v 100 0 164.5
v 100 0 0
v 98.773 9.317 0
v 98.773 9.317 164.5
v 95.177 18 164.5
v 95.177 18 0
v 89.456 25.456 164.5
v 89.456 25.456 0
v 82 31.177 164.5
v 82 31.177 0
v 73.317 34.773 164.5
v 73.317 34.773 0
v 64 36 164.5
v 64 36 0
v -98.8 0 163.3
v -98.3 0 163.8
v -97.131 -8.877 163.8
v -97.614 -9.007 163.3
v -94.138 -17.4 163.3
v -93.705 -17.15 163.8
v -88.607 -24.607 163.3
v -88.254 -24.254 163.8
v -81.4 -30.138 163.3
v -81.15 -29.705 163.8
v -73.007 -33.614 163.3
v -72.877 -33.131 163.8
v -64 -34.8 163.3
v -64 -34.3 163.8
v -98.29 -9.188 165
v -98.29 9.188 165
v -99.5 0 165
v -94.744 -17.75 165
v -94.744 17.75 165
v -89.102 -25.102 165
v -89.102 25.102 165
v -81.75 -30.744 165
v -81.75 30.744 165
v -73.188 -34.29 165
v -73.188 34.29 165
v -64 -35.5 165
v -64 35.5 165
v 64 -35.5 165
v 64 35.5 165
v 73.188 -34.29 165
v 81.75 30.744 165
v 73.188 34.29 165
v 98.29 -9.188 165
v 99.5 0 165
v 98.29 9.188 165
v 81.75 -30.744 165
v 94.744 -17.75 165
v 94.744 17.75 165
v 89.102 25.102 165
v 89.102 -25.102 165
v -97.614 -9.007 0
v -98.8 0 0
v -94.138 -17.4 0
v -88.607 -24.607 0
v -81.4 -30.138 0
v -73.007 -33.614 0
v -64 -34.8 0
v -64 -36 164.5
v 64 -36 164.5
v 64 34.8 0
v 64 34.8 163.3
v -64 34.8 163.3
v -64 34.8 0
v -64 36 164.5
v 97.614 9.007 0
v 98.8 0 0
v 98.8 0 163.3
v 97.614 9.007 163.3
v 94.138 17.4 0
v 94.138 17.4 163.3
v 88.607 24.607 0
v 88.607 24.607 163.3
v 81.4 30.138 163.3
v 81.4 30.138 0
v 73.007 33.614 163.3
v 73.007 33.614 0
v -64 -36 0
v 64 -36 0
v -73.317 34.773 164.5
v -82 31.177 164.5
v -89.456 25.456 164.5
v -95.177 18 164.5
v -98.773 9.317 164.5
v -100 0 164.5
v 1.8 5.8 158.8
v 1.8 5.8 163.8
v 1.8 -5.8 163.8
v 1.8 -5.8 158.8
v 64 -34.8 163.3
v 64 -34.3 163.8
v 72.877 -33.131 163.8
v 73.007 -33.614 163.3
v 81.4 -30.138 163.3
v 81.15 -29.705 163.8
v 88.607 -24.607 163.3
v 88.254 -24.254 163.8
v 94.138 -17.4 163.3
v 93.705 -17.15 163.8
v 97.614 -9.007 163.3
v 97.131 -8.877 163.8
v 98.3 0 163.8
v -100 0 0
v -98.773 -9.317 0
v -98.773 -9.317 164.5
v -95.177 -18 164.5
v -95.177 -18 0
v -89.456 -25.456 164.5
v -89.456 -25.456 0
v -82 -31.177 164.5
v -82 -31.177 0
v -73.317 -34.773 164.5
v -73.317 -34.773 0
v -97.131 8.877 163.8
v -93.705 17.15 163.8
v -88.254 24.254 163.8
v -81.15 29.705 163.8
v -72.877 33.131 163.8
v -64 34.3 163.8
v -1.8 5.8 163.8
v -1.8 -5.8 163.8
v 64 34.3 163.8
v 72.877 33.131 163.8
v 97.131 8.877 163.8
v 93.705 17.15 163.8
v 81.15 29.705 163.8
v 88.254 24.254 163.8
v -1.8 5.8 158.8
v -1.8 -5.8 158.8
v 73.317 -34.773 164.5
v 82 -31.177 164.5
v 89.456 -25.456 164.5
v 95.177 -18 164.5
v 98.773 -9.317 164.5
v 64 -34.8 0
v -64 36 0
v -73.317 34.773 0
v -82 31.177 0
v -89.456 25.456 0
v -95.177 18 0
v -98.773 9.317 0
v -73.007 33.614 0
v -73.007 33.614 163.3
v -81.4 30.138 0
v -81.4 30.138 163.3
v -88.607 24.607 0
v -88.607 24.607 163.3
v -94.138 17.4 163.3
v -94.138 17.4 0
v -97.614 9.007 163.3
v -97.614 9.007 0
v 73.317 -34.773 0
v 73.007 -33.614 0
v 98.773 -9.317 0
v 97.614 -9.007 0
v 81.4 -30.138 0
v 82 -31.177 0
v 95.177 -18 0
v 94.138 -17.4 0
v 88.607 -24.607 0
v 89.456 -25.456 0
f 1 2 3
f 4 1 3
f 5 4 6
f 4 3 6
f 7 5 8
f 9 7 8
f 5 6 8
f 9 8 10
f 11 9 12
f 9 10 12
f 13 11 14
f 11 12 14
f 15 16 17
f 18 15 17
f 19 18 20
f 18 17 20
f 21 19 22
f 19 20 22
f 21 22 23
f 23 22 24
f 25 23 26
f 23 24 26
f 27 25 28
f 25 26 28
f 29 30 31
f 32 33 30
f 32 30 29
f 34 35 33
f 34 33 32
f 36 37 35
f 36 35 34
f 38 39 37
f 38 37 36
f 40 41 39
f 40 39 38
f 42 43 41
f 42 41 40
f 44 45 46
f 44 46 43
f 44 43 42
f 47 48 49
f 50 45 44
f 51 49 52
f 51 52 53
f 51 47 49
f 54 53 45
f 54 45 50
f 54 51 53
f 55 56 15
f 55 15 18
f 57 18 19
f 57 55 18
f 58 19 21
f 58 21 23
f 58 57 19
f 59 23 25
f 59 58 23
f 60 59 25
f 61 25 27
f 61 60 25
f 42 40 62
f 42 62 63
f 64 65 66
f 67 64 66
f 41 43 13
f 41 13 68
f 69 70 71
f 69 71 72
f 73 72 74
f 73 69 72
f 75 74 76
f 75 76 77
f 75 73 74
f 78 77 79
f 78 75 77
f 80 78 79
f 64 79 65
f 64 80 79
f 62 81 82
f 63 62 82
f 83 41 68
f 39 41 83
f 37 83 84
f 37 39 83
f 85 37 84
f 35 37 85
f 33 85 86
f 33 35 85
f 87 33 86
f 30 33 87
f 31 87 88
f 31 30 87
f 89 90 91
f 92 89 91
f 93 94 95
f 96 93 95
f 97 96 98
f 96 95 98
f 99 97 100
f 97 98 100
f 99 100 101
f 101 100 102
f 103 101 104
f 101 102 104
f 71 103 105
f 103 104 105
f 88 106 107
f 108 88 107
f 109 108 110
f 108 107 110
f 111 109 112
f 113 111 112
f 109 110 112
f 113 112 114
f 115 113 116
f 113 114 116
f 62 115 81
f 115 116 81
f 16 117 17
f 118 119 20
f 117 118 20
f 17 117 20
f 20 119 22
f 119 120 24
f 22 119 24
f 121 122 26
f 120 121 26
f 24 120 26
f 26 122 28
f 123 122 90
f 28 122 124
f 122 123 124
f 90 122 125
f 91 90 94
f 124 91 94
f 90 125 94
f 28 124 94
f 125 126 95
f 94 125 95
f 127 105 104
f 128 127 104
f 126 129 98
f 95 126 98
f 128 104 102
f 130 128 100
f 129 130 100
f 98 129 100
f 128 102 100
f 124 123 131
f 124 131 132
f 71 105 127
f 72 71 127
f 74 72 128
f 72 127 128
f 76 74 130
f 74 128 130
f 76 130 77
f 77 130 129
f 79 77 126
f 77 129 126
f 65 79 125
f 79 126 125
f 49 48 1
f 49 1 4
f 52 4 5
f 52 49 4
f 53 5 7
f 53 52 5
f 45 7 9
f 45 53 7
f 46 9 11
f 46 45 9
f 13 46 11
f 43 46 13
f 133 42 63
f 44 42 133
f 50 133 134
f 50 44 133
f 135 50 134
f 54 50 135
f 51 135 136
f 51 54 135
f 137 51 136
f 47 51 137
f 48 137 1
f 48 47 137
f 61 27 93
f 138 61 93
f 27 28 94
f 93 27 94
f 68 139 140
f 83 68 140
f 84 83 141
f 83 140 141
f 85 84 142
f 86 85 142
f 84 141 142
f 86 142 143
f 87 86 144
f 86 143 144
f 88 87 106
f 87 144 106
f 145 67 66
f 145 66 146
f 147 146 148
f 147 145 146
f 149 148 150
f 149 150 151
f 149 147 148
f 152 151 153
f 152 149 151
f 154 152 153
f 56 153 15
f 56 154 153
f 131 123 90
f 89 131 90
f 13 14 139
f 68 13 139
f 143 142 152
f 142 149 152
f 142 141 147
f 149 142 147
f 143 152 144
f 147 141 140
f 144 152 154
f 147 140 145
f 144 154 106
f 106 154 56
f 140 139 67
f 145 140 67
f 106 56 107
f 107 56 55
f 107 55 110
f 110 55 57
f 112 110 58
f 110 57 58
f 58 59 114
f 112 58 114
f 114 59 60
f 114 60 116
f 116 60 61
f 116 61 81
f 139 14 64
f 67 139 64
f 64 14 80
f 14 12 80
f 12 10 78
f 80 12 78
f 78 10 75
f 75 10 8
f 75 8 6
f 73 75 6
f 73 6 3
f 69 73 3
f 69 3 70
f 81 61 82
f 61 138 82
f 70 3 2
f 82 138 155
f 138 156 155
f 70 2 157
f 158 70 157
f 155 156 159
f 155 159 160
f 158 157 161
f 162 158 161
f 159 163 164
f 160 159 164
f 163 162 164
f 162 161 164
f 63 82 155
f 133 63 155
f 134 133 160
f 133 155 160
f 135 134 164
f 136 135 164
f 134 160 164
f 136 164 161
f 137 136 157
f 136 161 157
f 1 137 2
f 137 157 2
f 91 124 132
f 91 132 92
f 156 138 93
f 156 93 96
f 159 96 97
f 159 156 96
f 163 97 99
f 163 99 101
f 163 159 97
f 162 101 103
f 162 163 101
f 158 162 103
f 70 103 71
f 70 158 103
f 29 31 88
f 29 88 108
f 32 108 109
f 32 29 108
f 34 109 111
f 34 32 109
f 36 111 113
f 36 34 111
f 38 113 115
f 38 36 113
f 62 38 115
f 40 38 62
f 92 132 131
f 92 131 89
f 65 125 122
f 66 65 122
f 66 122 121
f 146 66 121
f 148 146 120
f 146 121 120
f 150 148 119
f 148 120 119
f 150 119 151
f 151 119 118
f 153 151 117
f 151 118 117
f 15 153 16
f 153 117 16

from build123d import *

# Parameters (mm, degrees)
F4_T     = -1.2
F5_SIZE  = 0.5
F6_W     = 3.6
F6_H     = 11.6
F7_DEPTH = 5


with BuildPart() as f3:
    # F2 (on offset) → F3 section 0
    with BuildSketch(Plane.XY.offset(165)):
        with BuildLine():
            Line((-64, -36), (64, -36))
            ThreePointArc((64, -36), (89.4558441227, -25.4558441227), (100, 0))
            ThreePointArc((100, 0), (89.4558441227, 25.4558441227), (64, 36))
            Line((64, 36), (-64, 36))
            ThreePointArc((-64, 36), (-89.4558441227, 25.4558441227), (-100, 0))
            ThreePointArc((-100, 0), (-89.4558441227, -25.4558441227), (-64, -36))
        make_face()
    # F0 (on Top) → F3 section 1
    with BuildSketch(Plane.XY):
        with BuildLine():
            Line((-64, -36), (64, -36))
            ThreePointArc((64, -36), (89.4558441227, -25.4558441227), (100, 0))
            ThreePointArc((100, 0), (89.4558441227, 25.4558441227), (64, 36))
            Line((64, 36), (-64, 36))
            ThreePointArc((-64, 36), (-89.4558441227, 25.4558441227), (-100, 0))
            ThreePointArc((-100, 0), (-89.4558441227, -25.4558441227), (-64, -36))
        make_face()
    loft()

    # F4
    f4_openings = [f3.faces().sort_by_distance(p)[0] for p in [
        (0, 0, 0),
    ]]
    offset(amount=F4_T, openings=f4_openings)

    # F5
    f5_edges = [f3.edges().sort_by_distance(p)[0] for p in [
        (-100, 0, 165),
        (0, 36, 165),
        (100, 0, 165),
        (0, -36, 165),
        (-98.8, 0, 163.8),
        (0, -34.8, 163.8),
        (98.8, 0, 163.8),
        (0, 34.8, 163.8),
    ]]
    chamfer(f5_edges, length=F5_SIZE)

    # F6 (on face) → F7 (join)
    with BuildSketch(Plane(origin=(0, 0, 163.8), x_dir=(1, 0, 0), z_dir=(0, 0, -1))):
        Rectangle(F6_W, F6_H)
    extrude(amount=F7_DEPTH)


solid = f3.part
